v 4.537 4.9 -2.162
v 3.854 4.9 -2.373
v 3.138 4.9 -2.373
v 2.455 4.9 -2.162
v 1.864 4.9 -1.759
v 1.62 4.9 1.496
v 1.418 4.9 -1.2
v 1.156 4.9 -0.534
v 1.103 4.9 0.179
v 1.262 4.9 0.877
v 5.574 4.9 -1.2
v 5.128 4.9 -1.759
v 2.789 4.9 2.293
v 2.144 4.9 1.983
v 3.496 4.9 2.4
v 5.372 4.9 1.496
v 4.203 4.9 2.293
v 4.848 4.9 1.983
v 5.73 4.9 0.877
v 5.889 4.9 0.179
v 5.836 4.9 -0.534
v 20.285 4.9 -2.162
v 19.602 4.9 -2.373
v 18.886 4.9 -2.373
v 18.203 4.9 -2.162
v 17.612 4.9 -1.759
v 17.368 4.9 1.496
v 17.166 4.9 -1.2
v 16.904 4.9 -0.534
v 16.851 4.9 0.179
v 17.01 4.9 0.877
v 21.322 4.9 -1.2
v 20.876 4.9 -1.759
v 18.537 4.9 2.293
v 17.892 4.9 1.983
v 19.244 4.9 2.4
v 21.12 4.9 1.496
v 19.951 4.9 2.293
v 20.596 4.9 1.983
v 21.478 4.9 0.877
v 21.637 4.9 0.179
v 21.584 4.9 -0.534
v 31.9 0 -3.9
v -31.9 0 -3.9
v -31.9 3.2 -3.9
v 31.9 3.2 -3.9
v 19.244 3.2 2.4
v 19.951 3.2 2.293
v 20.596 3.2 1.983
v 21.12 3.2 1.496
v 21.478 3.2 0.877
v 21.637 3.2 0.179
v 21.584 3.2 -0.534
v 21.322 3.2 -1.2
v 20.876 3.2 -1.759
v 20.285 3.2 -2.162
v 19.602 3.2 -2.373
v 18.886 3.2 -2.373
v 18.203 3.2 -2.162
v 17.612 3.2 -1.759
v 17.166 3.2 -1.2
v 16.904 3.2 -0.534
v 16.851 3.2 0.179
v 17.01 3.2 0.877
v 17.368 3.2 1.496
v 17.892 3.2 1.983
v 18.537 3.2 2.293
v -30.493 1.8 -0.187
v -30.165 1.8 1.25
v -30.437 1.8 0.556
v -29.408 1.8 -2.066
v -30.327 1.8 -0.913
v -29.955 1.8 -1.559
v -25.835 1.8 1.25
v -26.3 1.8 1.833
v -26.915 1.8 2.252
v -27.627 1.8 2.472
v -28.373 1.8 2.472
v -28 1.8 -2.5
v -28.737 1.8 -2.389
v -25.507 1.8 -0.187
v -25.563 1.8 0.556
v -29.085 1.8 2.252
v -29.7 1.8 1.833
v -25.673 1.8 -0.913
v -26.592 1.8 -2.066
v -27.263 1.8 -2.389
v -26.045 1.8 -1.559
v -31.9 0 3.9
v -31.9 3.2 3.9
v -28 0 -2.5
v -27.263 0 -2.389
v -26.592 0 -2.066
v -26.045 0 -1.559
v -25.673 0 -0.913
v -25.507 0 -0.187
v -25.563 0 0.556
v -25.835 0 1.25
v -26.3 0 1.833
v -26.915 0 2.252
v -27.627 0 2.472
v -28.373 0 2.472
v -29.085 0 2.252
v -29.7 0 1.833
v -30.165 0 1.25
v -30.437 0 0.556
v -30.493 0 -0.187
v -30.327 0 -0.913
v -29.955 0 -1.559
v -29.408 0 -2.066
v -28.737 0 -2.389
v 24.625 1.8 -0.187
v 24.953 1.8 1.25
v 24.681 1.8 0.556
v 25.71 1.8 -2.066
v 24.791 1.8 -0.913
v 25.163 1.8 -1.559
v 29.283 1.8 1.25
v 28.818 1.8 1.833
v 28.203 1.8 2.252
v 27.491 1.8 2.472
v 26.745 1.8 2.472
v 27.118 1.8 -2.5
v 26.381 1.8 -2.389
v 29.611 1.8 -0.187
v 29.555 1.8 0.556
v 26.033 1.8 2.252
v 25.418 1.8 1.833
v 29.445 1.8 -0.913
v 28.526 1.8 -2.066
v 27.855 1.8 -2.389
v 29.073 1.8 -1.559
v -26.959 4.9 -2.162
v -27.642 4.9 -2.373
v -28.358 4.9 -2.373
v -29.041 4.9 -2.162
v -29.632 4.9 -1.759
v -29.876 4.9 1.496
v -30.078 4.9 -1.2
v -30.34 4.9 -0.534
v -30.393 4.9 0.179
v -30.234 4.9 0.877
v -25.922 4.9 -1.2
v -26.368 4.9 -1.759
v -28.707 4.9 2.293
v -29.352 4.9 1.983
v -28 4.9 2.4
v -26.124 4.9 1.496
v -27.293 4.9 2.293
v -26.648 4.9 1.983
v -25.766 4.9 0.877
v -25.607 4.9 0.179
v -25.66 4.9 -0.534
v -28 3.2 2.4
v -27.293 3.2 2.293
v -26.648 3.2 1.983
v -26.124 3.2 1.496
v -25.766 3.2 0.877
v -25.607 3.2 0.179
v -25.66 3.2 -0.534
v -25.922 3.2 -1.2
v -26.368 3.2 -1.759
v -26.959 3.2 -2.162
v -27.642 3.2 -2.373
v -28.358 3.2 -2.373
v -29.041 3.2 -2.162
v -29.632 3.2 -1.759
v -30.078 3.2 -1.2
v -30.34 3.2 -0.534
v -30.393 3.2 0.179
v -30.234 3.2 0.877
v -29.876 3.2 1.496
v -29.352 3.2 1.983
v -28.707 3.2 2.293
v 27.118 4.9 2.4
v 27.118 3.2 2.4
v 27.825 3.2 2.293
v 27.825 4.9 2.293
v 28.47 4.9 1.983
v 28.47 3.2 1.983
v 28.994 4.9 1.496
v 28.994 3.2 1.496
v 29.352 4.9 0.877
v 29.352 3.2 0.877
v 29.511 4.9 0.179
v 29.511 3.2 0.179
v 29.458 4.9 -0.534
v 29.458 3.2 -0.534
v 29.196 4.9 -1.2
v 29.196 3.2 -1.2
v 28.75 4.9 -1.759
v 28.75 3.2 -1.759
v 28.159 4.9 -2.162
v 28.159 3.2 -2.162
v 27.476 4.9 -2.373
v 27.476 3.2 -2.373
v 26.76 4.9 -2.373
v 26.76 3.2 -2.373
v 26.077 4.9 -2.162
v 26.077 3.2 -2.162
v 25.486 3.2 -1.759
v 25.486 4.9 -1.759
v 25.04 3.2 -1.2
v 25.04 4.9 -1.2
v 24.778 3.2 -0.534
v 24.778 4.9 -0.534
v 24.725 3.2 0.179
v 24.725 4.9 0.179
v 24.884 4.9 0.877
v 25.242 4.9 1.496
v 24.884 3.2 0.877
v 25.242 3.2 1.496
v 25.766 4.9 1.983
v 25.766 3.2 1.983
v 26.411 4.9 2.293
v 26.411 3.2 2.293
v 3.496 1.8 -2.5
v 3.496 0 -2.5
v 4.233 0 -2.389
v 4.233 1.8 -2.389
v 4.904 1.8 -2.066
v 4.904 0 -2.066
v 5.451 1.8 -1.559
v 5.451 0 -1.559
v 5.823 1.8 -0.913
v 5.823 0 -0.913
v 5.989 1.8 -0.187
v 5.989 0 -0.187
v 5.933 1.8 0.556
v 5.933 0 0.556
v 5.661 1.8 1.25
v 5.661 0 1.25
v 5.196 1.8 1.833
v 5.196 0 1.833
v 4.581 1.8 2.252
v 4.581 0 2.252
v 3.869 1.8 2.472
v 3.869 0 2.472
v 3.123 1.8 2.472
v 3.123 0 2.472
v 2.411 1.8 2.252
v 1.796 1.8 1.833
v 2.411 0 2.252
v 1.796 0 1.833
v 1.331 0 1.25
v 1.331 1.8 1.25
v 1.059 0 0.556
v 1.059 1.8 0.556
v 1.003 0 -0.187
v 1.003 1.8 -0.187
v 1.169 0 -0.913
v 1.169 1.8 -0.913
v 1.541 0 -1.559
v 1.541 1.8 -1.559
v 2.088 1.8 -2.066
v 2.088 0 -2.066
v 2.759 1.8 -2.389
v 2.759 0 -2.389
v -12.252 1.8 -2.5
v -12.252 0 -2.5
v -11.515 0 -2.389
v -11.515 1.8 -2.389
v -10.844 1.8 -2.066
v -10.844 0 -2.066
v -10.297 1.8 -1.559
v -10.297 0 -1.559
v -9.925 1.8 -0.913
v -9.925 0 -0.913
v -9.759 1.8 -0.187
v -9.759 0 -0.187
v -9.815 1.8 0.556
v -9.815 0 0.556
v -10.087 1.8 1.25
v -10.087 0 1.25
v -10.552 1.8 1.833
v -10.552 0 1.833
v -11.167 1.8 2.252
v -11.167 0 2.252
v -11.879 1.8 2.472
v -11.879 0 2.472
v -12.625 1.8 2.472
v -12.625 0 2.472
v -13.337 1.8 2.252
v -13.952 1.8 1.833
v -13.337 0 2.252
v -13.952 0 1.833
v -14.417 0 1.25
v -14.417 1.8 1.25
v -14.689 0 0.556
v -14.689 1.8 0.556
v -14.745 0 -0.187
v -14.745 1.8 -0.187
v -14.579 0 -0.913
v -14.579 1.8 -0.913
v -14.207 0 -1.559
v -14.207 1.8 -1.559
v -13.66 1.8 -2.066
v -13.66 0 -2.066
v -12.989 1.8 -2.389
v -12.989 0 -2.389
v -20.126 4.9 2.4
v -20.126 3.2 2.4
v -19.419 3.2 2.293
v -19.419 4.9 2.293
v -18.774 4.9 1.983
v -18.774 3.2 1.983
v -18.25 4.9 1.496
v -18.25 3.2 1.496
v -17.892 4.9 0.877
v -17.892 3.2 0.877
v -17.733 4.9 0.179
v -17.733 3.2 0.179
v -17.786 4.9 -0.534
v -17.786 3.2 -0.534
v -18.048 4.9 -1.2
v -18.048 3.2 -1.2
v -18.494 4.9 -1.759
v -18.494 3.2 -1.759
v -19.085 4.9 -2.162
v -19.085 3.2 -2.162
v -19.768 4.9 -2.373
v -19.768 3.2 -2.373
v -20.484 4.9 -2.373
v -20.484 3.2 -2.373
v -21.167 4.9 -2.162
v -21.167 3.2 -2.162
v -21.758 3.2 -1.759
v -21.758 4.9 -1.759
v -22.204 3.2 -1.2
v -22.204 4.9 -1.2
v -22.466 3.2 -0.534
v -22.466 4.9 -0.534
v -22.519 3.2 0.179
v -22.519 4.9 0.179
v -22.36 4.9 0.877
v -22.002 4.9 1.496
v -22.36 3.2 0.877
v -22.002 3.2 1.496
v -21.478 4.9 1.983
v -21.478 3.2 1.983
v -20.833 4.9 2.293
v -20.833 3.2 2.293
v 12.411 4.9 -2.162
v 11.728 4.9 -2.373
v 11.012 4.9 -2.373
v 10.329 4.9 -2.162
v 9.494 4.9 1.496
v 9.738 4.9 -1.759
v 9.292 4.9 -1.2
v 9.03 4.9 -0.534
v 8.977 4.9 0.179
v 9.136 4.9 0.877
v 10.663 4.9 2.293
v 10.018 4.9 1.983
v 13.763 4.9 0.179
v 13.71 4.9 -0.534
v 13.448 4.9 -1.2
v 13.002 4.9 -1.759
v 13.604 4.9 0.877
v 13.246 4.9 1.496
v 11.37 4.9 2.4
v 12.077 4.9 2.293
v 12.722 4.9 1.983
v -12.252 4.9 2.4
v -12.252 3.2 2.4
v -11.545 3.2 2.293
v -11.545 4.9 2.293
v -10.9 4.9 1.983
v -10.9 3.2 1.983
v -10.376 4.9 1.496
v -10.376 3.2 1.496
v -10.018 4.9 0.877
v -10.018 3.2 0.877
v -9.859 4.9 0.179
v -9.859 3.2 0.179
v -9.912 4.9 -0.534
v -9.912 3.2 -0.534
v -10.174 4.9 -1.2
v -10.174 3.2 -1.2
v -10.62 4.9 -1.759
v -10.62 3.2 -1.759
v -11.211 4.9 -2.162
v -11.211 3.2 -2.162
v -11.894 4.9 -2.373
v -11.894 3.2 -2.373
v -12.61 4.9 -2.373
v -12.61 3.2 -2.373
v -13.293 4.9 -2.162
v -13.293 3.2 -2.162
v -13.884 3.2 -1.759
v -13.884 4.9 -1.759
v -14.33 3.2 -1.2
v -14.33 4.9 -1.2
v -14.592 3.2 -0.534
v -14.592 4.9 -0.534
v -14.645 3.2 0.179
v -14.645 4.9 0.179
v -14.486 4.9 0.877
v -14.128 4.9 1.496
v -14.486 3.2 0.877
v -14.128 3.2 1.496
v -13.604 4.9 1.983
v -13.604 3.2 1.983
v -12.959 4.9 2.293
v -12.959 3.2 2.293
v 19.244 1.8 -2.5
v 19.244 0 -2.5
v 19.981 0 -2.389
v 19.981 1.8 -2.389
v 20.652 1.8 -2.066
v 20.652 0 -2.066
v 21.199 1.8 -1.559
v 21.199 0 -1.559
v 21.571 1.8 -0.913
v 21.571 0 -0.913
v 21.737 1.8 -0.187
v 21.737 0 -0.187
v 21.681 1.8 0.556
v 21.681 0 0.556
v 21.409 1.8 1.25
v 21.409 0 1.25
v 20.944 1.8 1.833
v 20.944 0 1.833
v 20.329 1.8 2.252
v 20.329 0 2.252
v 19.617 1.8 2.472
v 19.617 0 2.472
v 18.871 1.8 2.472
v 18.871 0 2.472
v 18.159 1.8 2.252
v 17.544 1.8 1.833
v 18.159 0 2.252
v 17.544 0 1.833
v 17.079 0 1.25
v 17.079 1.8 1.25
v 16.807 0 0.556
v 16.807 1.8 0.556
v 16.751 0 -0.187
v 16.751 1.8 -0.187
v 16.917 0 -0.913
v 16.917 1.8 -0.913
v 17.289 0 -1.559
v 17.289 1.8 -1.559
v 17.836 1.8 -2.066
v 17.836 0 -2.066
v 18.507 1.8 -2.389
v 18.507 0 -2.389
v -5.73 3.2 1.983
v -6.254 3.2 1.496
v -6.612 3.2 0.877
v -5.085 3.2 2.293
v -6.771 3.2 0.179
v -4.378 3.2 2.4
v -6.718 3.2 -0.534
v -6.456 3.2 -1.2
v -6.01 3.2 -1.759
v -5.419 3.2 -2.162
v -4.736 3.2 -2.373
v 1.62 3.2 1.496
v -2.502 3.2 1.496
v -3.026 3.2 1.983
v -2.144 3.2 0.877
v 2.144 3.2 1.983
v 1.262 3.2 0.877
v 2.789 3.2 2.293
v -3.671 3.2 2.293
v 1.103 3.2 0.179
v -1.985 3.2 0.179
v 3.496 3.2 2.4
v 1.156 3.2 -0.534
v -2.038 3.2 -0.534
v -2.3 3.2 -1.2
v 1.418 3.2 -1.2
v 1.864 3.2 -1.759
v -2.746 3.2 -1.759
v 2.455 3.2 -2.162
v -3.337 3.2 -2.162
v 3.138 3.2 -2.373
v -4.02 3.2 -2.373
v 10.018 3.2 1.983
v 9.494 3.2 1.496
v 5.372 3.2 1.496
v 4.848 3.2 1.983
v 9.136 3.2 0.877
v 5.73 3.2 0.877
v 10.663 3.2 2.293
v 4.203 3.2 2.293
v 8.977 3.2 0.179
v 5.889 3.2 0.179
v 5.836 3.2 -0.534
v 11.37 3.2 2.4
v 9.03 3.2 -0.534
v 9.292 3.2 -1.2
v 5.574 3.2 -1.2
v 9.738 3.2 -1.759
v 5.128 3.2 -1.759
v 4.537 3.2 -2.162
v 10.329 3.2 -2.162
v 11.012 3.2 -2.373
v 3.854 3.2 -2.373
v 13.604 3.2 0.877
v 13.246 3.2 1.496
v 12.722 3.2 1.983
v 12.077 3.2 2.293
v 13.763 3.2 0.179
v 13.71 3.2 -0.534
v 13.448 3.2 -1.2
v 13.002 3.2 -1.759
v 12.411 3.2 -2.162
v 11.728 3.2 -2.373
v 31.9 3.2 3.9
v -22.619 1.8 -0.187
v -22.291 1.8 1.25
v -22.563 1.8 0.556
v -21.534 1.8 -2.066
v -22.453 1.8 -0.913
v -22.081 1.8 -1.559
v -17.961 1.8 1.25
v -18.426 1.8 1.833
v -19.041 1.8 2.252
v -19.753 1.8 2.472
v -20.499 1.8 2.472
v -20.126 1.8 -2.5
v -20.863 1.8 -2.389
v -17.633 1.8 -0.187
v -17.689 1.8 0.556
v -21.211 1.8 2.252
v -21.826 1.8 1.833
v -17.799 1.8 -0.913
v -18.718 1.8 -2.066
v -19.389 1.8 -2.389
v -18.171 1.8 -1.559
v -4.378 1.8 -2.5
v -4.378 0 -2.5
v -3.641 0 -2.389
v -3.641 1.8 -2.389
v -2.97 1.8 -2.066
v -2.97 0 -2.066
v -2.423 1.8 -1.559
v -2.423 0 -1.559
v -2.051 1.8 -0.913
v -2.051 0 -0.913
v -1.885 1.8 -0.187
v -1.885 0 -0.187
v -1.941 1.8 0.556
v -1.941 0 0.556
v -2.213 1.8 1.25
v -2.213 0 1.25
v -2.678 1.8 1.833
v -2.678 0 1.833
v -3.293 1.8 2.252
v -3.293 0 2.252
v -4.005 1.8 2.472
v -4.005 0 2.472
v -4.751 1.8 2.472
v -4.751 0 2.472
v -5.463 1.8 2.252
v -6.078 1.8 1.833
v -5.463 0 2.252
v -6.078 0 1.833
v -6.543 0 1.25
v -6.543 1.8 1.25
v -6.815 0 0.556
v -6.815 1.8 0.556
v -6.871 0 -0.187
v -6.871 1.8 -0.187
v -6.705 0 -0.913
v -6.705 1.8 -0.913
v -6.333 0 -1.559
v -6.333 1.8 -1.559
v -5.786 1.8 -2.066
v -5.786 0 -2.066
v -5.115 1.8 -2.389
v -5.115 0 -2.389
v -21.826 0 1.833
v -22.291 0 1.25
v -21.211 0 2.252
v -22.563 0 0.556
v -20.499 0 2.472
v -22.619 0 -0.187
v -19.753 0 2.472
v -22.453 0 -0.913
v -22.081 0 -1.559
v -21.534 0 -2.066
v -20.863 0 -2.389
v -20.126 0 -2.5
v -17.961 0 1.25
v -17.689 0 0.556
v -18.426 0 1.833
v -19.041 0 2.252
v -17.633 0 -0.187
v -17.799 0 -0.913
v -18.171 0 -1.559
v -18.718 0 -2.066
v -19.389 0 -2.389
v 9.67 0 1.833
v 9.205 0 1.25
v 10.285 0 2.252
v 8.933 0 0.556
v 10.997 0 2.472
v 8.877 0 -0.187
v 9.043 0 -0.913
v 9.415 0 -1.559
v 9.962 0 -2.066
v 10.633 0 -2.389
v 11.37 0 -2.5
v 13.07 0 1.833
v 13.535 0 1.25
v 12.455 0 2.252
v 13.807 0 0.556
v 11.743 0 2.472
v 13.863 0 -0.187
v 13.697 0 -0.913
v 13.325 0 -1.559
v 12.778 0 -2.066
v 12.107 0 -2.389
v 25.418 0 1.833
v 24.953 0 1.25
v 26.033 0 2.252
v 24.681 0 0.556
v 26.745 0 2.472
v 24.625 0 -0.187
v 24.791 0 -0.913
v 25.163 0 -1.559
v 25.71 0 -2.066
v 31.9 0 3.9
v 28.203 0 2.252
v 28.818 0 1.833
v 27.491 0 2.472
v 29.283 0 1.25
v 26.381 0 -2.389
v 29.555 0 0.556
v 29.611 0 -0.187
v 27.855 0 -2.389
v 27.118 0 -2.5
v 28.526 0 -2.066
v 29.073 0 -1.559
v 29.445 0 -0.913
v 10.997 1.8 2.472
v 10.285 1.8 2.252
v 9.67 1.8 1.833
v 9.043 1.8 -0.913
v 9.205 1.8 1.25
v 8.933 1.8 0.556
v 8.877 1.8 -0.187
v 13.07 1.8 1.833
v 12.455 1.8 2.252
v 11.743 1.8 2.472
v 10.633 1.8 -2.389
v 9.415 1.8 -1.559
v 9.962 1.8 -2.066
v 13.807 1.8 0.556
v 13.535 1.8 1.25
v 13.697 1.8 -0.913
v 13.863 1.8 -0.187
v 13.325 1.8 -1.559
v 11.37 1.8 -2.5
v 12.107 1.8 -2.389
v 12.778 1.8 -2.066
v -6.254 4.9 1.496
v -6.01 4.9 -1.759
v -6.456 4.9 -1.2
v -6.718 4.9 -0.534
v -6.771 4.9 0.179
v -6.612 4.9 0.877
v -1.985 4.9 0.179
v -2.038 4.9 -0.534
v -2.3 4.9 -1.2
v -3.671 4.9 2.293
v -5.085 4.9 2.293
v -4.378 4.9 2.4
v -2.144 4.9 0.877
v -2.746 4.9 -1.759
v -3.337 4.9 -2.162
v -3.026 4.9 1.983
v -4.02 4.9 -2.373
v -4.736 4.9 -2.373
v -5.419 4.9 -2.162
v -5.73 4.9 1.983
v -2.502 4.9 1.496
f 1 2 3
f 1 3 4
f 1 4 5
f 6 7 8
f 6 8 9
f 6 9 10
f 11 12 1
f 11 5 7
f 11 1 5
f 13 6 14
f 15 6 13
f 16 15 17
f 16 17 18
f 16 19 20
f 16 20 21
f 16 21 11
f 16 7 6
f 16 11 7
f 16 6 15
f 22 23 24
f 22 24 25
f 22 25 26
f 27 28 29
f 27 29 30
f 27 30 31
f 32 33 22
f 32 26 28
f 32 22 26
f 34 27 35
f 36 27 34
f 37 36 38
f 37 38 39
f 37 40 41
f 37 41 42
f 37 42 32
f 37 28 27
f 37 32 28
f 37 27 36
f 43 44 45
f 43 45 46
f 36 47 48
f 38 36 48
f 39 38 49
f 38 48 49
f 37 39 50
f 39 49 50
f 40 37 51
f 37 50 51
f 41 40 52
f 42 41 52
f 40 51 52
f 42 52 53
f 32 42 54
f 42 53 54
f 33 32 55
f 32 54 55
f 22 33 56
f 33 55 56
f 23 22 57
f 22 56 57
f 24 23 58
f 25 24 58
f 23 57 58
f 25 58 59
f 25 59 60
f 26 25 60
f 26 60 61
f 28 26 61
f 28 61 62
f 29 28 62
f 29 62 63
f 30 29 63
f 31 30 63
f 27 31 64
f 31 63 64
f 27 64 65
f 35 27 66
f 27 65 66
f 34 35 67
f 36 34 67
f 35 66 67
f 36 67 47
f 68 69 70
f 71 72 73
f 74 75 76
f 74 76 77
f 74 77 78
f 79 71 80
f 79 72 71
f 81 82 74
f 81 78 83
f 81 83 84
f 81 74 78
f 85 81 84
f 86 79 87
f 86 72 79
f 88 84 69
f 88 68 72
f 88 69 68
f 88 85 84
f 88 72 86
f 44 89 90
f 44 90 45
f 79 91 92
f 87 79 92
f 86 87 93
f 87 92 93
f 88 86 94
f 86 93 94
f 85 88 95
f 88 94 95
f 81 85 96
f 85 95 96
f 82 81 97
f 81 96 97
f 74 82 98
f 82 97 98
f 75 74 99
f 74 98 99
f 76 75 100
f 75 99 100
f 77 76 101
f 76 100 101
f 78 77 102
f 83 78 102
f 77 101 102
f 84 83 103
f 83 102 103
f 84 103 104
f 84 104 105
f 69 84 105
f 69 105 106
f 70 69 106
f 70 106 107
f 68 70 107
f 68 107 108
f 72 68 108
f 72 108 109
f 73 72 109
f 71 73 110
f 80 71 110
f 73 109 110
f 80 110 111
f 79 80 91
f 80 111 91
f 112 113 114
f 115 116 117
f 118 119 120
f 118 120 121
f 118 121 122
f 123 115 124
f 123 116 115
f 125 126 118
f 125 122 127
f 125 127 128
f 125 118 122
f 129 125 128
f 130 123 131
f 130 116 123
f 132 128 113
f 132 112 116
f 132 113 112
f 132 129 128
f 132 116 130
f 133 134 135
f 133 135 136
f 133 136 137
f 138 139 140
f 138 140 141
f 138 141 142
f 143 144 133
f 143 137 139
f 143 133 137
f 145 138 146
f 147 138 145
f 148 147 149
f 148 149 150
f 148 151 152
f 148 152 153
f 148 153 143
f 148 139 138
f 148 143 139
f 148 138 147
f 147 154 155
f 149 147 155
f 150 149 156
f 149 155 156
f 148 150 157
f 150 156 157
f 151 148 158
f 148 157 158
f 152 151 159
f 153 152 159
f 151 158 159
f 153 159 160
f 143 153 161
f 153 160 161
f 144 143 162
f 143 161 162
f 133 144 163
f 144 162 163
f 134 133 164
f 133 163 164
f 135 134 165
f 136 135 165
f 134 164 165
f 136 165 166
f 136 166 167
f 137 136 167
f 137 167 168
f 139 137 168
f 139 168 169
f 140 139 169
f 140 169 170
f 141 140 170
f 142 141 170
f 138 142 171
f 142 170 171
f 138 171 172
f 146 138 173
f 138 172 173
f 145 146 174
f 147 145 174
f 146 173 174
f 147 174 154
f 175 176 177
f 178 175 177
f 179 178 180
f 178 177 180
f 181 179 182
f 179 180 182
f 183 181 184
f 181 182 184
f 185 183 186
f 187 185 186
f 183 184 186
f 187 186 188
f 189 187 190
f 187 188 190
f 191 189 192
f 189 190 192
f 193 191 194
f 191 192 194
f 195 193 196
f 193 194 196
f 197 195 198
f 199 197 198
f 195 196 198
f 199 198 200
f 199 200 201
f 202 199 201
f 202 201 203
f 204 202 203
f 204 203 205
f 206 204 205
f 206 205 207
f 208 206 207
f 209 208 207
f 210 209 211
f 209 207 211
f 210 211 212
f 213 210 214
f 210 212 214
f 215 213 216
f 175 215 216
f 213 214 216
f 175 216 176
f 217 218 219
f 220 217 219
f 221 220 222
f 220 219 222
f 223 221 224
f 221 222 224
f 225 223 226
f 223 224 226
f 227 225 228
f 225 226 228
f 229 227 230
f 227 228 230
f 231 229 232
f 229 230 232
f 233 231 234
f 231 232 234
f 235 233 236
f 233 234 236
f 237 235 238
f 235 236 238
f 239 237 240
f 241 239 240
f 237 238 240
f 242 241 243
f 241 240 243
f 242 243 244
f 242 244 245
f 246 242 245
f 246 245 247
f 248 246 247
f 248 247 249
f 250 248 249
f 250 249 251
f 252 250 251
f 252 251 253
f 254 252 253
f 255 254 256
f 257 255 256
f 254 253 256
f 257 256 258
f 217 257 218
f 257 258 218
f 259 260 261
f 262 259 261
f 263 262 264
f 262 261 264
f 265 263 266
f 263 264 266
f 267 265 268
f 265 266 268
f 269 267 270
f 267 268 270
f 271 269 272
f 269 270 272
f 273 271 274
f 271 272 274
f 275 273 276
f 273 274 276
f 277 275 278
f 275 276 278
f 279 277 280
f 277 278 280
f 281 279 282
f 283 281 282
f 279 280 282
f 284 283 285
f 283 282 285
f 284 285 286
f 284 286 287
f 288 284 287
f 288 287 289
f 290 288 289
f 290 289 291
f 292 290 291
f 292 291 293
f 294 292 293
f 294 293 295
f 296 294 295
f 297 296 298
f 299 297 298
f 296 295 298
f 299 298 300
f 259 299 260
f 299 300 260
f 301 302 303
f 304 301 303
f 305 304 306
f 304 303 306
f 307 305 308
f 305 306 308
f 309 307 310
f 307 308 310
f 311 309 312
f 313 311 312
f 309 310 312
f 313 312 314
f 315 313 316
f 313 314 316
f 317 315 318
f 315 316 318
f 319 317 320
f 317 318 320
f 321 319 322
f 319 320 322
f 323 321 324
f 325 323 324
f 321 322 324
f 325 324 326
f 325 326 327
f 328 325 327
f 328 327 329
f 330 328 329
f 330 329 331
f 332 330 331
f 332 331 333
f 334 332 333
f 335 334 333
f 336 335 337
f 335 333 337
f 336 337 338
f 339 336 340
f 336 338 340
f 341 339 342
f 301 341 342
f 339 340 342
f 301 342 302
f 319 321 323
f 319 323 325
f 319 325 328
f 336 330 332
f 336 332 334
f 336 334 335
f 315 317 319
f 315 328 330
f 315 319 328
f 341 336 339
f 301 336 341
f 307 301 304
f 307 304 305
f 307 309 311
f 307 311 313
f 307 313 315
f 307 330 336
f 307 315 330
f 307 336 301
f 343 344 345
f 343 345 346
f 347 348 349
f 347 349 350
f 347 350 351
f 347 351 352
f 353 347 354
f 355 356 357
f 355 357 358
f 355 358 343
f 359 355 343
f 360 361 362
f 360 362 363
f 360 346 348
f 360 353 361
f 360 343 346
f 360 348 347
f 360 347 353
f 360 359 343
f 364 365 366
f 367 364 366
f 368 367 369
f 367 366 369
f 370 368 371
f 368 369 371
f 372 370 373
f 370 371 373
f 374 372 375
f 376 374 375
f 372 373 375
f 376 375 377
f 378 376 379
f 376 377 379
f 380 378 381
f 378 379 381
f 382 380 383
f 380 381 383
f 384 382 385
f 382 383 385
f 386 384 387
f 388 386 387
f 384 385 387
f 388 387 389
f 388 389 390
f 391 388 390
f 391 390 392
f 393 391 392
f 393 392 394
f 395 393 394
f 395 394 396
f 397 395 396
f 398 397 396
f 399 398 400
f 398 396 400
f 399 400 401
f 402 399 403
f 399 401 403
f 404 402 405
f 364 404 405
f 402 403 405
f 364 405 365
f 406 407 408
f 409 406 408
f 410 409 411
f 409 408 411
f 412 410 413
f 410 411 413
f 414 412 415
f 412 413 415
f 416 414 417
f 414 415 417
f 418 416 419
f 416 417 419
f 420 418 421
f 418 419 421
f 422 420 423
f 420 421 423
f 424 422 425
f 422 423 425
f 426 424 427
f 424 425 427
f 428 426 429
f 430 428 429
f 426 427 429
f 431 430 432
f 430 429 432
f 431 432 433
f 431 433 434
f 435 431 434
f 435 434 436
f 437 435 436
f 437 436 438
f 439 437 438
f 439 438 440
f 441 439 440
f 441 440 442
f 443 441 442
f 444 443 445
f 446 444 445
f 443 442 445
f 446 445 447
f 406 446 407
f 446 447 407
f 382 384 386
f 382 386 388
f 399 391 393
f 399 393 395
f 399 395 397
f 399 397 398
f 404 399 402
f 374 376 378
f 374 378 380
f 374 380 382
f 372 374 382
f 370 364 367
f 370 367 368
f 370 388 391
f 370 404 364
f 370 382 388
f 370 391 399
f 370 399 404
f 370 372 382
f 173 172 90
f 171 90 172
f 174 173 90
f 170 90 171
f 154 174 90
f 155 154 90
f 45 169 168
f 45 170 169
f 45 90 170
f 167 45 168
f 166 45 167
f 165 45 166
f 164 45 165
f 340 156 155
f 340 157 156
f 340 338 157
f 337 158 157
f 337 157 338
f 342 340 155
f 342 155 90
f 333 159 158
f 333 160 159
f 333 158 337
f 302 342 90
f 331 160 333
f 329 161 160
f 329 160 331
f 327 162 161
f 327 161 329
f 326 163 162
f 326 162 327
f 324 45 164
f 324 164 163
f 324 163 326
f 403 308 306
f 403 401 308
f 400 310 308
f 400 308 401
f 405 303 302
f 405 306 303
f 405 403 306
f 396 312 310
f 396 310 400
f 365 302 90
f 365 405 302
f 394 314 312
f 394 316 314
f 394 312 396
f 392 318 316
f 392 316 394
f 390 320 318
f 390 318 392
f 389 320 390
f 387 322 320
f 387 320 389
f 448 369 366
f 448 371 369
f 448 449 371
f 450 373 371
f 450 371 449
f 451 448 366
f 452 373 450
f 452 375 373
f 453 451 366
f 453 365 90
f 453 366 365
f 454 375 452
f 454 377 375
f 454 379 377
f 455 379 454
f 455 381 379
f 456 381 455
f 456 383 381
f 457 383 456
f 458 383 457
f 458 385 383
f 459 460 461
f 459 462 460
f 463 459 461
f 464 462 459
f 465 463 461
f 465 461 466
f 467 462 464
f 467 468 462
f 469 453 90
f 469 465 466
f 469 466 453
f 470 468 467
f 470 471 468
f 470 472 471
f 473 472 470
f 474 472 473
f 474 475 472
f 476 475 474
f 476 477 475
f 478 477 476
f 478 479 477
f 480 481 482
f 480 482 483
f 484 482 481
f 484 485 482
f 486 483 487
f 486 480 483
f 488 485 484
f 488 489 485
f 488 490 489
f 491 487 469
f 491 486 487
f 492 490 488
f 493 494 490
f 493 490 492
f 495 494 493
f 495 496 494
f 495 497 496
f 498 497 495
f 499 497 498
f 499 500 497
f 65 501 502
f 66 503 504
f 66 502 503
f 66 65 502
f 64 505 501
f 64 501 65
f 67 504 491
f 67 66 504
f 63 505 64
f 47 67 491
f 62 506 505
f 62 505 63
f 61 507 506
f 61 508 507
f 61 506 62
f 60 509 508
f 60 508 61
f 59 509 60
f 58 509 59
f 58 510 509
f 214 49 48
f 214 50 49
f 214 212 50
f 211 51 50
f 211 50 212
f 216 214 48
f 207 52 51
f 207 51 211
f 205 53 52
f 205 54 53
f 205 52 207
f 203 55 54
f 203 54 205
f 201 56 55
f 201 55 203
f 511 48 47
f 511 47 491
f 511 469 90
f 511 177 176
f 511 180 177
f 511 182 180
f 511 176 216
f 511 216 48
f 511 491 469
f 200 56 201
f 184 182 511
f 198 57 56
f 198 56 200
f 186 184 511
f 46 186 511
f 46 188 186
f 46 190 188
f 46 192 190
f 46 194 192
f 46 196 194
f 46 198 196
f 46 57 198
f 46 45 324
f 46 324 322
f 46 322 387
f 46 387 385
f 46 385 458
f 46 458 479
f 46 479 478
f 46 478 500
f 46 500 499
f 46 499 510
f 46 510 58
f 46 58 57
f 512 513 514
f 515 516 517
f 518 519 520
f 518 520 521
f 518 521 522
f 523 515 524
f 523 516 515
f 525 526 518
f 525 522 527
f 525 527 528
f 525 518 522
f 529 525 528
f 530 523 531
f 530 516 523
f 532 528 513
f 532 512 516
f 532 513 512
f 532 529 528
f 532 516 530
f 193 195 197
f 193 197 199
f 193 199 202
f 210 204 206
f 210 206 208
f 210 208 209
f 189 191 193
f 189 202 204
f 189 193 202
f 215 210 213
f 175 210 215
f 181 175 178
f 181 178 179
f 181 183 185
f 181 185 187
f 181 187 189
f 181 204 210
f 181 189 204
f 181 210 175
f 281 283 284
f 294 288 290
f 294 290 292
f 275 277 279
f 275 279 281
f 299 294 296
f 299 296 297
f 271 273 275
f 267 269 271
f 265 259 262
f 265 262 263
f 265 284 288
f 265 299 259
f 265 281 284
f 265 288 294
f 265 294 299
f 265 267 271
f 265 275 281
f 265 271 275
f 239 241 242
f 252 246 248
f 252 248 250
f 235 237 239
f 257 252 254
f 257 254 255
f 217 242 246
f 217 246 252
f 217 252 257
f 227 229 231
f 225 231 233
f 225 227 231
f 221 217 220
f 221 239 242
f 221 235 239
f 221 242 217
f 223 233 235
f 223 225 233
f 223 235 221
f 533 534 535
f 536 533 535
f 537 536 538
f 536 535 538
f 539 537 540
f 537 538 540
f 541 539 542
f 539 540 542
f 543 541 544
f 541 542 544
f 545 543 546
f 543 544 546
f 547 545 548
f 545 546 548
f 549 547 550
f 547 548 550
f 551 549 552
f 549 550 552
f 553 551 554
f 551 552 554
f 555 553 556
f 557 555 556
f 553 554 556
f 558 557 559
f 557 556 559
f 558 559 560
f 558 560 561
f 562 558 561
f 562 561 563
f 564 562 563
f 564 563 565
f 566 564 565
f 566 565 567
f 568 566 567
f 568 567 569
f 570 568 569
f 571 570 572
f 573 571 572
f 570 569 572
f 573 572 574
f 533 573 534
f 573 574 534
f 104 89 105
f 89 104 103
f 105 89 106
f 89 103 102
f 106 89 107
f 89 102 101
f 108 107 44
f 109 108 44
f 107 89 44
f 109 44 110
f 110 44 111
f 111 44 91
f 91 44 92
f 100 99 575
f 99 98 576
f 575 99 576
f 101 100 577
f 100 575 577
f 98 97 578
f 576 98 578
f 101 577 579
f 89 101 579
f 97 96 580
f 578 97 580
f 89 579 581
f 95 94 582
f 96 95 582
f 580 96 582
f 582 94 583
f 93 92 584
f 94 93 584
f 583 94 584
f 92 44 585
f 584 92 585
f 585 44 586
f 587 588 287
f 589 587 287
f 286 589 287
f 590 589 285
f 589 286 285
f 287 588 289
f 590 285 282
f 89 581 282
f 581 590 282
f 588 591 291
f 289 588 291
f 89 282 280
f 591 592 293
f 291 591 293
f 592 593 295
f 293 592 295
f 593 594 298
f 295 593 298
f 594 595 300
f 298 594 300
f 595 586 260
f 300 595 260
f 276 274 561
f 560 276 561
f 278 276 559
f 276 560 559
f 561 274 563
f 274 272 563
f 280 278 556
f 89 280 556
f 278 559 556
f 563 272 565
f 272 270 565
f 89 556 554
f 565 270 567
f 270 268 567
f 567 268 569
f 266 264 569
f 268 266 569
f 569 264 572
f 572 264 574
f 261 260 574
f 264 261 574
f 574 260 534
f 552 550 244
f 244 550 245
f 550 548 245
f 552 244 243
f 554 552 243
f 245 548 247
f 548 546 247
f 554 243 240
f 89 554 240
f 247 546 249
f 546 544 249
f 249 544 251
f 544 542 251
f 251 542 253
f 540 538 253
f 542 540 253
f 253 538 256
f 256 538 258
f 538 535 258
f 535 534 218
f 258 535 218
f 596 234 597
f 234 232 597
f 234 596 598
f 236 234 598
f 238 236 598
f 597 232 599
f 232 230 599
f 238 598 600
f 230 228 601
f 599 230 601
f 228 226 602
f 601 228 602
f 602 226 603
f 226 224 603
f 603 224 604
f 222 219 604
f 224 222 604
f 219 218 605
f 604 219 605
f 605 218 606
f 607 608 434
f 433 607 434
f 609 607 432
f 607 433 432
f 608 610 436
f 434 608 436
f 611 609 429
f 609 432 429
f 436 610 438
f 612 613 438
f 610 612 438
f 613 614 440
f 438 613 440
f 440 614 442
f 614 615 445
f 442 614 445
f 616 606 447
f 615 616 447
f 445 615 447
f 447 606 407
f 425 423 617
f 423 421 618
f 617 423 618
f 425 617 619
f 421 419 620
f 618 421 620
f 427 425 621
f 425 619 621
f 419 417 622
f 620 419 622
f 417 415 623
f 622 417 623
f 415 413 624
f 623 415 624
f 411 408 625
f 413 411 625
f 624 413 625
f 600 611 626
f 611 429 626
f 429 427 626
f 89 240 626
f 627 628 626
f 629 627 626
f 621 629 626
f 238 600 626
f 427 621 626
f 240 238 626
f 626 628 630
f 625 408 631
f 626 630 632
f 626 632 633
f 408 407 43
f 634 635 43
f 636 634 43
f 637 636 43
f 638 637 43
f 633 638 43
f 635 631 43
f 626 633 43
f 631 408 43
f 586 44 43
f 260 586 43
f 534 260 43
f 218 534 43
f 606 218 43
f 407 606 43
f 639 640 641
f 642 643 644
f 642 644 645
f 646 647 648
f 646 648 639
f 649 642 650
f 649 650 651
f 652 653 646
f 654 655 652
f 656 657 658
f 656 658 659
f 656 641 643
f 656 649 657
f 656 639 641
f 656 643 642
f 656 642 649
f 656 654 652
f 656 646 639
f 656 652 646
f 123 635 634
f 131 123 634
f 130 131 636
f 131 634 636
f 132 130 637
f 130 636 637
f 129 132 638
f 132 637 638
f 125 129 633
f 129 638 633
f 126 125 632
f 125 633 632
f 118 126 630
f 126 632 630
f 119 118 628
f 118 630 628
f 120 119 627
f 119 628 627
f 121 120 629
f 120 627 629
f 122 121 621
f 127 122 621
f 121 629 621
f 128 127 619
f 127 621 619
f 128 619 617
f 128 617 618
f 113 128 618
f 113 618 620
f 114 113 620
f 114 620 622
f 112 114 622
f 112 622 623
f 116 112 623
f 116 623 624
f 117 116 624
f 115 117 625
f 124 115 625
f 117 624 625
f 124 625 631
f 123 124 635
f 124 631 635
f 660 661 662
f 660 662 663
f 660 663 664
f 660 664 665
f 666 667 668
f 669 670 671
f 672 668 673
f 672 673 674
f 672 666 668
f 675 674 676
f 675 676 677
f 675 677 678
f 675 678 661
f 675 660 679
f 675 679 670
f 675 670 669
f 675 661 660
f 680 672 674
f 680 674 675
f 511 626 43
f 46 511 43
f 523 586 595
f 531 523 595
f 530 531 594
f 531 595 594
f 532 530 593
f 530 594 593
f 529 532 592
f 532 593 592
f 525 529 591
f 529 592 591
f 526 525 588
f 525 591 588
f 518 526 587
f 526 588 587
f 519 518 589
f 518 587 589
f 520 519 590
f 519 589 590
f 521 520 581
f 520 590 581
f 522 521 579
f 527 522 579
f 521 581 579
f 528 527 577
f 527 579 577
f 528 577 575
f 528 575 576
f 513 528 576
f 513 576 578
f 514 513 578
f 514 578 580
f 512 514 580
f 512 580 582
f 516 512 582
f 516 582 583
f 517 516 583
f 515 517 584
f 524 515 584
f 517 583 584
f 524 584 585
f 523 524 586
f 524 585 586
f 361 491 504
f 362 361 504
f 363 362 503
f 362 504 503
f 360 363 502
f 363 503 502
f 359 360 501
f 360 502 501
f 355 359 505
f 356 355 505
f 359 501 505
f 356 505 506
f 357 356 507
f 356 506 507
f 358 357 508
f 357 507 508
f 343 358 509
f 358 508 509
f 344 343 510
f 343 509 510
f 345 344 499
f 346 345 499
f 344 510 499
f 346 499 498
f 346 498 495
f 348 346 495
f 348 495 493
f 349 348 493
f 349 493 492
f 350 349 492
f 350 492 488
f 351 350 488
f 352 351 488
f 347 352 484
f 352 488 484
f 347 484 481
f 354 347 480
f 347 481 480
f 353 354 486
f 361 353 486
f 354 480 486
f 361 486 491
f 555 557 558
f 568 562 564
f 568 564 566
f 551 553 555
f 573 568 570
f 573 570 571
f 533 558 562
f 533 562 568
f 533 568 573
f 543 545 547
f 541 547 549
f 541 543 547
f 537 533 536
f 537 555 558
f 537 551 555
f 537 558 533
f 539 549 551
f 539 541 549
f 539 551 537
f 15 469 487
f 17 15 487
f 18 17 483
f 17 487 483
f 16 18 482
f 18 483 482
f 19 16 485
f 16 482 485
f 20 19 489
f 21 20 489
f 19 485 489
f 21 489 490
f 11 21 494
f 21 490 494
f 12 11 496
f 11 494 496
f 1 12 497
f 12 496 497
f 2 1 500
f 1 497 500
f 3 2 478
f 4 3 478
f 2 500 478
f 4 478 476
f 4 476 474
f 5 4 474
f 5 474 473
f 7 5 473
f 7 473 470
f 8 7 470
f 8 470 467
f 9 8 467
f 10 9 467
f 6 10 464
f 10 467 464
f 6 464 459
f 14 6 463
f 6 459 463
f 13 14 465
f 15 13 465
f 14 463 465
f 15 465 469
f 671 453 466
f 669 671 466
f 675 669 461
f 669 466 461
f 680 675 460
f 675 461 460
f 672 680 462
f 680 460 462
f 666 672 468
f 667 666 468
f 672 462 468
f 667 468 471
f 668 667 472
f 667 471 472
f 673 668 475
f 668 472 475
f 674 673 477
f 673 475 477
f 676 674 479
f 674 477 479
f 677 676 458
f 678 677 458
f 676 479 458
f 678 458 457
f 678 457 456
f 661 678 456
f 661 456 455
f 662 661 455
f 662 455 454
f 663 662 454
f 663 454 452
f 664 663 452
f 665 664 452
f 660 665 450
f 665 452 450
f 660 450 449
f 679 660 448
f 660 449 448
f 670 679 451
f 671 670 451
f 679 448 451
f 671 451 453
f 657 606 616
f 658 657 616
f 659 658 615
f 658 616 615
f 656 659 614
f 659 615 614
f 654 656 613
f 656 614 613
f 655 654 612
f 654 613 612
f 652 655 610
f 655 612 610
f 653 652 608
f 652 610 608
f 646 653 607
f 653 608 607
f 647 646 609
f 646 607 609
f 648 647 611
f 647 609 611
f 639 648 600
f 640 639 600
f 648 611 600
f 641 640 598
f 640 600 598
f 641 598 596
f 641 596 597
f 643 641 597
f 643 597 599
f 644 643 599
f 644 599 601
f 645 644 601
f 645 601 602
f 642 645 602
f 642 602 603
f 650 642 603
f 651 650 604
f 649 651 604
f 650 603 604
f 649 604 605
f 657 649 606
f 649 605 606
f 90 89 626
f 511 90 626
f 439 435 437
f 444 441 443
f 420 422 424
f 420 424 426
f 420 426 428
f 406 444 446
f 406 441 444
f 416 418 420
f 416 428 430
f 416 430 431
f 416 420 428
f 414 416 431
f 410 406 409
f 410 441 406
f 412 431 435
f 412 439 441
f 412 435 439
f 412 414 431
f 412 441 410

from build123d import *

# Parameters (mm, degrees)
SKETCH_1_W          = 63.8
SKETCH_1_H          = 7.8
EXTRUDE_1_DEPTH     = 3.2
SKETCH_2_R          = 2.4
EXTRUDE_2_DEPTH     = 1.7
SKETCH_3_R          = 2.5
CUT_EXTRUDE_1_DEPTH = 1.8


with BuildPart() as part:
    # Эскиз1 → Бобышка-Вытянуть1 (new body)
    with BuildSketch(Plane(origin=(0, 0, 0), x_dir=(1, 0, 0), z_dir=(0, 1, 0))):
        Rectangle(SKETCH_1_W, SKETCH_1_H)
    extrude(amount=EXTRUDE_1_DEPTH)

    # Эскиз2 → Бобышка-Вытянуть2 (add)
    with BuildSketch(Plane(origin=(0, 3.2, 0), x_dir=(1, 0, 0), z_dir=(0, 1, 0))):
        with Locations(Location((-28, 0, 0), (0, 0, 270))):
            Circle(SKETCH_2_R)
        with Locations(Location((-20.126, 0, 0), (0, 0, 270))):
            Circle(SKETCH_2_R)
        with Locations(Location((-12.252, 0, 0), (0, 0, 270))):
            Circle(SKETCH_2_R)
        with Locations(Location((-4.378, 0, 0), (0, 0, 270))):
            Circle(SKETCH_2_R)
        with Locations(Location((3.496, 0, 0), (0, 0, 270))):
            Circle(SKETCH_2_R)
        with Locations(Location((11.37, 0, 0), (0, 0, 270))):
            Circle(SKETCH_2_R)
        with Locations(Location((19.244, 0, 0), (0, 0, 270))):
            Circle(SKETCH_2_R)
        with Locations(Location((27.118, 0, 0), (0, 0, 270))):
            Circle(SKETCH_2_R)
    extrude(amount=EXTRUDE_2_DEPTH)

    # Эскиз3 → Вырез-Вытянуть1 (cut)
    with BuildSketch(Plane.XZ):
        with Locations(Location((-28, 0, 0), (0, 0, 270))):
            Circle(SKETCH_3_R)
        with Locations(Location((-20.126, 0, 0), (0, 0, 270))):
            Circle(SKETCH_3_R)
        with Locations(Location((-12.252, 0, 0), (0, 0, 270))):
            Circle(SKETCH_3_R)
        with Locations(Location((-4.378, 0, 0), (0, 0, 270))):
            Circle(SKETCH_3_R)
        with Locations(Location((3.496, 0, 0), (0, 0, 270))):
            Circle(SKETCH_3_R)
        with Locations(Location((11.37, 0, 0), (0, 0, 270))):
            Circle(SKETCH_3_R)
        with Locations(Location((19.244, 0, 0), (0, 0, 270))):
            Circle(SKETCH_3_R)
        with Locations(Location((27.118, 0, 0), (0, 0, 270))):
            Circle(SKETCH_3_R)
    extrude(amount=-CUT_EXTRUDE_1_DEPTH, mode=Mode.SUBTRACT)


solid = part.part
